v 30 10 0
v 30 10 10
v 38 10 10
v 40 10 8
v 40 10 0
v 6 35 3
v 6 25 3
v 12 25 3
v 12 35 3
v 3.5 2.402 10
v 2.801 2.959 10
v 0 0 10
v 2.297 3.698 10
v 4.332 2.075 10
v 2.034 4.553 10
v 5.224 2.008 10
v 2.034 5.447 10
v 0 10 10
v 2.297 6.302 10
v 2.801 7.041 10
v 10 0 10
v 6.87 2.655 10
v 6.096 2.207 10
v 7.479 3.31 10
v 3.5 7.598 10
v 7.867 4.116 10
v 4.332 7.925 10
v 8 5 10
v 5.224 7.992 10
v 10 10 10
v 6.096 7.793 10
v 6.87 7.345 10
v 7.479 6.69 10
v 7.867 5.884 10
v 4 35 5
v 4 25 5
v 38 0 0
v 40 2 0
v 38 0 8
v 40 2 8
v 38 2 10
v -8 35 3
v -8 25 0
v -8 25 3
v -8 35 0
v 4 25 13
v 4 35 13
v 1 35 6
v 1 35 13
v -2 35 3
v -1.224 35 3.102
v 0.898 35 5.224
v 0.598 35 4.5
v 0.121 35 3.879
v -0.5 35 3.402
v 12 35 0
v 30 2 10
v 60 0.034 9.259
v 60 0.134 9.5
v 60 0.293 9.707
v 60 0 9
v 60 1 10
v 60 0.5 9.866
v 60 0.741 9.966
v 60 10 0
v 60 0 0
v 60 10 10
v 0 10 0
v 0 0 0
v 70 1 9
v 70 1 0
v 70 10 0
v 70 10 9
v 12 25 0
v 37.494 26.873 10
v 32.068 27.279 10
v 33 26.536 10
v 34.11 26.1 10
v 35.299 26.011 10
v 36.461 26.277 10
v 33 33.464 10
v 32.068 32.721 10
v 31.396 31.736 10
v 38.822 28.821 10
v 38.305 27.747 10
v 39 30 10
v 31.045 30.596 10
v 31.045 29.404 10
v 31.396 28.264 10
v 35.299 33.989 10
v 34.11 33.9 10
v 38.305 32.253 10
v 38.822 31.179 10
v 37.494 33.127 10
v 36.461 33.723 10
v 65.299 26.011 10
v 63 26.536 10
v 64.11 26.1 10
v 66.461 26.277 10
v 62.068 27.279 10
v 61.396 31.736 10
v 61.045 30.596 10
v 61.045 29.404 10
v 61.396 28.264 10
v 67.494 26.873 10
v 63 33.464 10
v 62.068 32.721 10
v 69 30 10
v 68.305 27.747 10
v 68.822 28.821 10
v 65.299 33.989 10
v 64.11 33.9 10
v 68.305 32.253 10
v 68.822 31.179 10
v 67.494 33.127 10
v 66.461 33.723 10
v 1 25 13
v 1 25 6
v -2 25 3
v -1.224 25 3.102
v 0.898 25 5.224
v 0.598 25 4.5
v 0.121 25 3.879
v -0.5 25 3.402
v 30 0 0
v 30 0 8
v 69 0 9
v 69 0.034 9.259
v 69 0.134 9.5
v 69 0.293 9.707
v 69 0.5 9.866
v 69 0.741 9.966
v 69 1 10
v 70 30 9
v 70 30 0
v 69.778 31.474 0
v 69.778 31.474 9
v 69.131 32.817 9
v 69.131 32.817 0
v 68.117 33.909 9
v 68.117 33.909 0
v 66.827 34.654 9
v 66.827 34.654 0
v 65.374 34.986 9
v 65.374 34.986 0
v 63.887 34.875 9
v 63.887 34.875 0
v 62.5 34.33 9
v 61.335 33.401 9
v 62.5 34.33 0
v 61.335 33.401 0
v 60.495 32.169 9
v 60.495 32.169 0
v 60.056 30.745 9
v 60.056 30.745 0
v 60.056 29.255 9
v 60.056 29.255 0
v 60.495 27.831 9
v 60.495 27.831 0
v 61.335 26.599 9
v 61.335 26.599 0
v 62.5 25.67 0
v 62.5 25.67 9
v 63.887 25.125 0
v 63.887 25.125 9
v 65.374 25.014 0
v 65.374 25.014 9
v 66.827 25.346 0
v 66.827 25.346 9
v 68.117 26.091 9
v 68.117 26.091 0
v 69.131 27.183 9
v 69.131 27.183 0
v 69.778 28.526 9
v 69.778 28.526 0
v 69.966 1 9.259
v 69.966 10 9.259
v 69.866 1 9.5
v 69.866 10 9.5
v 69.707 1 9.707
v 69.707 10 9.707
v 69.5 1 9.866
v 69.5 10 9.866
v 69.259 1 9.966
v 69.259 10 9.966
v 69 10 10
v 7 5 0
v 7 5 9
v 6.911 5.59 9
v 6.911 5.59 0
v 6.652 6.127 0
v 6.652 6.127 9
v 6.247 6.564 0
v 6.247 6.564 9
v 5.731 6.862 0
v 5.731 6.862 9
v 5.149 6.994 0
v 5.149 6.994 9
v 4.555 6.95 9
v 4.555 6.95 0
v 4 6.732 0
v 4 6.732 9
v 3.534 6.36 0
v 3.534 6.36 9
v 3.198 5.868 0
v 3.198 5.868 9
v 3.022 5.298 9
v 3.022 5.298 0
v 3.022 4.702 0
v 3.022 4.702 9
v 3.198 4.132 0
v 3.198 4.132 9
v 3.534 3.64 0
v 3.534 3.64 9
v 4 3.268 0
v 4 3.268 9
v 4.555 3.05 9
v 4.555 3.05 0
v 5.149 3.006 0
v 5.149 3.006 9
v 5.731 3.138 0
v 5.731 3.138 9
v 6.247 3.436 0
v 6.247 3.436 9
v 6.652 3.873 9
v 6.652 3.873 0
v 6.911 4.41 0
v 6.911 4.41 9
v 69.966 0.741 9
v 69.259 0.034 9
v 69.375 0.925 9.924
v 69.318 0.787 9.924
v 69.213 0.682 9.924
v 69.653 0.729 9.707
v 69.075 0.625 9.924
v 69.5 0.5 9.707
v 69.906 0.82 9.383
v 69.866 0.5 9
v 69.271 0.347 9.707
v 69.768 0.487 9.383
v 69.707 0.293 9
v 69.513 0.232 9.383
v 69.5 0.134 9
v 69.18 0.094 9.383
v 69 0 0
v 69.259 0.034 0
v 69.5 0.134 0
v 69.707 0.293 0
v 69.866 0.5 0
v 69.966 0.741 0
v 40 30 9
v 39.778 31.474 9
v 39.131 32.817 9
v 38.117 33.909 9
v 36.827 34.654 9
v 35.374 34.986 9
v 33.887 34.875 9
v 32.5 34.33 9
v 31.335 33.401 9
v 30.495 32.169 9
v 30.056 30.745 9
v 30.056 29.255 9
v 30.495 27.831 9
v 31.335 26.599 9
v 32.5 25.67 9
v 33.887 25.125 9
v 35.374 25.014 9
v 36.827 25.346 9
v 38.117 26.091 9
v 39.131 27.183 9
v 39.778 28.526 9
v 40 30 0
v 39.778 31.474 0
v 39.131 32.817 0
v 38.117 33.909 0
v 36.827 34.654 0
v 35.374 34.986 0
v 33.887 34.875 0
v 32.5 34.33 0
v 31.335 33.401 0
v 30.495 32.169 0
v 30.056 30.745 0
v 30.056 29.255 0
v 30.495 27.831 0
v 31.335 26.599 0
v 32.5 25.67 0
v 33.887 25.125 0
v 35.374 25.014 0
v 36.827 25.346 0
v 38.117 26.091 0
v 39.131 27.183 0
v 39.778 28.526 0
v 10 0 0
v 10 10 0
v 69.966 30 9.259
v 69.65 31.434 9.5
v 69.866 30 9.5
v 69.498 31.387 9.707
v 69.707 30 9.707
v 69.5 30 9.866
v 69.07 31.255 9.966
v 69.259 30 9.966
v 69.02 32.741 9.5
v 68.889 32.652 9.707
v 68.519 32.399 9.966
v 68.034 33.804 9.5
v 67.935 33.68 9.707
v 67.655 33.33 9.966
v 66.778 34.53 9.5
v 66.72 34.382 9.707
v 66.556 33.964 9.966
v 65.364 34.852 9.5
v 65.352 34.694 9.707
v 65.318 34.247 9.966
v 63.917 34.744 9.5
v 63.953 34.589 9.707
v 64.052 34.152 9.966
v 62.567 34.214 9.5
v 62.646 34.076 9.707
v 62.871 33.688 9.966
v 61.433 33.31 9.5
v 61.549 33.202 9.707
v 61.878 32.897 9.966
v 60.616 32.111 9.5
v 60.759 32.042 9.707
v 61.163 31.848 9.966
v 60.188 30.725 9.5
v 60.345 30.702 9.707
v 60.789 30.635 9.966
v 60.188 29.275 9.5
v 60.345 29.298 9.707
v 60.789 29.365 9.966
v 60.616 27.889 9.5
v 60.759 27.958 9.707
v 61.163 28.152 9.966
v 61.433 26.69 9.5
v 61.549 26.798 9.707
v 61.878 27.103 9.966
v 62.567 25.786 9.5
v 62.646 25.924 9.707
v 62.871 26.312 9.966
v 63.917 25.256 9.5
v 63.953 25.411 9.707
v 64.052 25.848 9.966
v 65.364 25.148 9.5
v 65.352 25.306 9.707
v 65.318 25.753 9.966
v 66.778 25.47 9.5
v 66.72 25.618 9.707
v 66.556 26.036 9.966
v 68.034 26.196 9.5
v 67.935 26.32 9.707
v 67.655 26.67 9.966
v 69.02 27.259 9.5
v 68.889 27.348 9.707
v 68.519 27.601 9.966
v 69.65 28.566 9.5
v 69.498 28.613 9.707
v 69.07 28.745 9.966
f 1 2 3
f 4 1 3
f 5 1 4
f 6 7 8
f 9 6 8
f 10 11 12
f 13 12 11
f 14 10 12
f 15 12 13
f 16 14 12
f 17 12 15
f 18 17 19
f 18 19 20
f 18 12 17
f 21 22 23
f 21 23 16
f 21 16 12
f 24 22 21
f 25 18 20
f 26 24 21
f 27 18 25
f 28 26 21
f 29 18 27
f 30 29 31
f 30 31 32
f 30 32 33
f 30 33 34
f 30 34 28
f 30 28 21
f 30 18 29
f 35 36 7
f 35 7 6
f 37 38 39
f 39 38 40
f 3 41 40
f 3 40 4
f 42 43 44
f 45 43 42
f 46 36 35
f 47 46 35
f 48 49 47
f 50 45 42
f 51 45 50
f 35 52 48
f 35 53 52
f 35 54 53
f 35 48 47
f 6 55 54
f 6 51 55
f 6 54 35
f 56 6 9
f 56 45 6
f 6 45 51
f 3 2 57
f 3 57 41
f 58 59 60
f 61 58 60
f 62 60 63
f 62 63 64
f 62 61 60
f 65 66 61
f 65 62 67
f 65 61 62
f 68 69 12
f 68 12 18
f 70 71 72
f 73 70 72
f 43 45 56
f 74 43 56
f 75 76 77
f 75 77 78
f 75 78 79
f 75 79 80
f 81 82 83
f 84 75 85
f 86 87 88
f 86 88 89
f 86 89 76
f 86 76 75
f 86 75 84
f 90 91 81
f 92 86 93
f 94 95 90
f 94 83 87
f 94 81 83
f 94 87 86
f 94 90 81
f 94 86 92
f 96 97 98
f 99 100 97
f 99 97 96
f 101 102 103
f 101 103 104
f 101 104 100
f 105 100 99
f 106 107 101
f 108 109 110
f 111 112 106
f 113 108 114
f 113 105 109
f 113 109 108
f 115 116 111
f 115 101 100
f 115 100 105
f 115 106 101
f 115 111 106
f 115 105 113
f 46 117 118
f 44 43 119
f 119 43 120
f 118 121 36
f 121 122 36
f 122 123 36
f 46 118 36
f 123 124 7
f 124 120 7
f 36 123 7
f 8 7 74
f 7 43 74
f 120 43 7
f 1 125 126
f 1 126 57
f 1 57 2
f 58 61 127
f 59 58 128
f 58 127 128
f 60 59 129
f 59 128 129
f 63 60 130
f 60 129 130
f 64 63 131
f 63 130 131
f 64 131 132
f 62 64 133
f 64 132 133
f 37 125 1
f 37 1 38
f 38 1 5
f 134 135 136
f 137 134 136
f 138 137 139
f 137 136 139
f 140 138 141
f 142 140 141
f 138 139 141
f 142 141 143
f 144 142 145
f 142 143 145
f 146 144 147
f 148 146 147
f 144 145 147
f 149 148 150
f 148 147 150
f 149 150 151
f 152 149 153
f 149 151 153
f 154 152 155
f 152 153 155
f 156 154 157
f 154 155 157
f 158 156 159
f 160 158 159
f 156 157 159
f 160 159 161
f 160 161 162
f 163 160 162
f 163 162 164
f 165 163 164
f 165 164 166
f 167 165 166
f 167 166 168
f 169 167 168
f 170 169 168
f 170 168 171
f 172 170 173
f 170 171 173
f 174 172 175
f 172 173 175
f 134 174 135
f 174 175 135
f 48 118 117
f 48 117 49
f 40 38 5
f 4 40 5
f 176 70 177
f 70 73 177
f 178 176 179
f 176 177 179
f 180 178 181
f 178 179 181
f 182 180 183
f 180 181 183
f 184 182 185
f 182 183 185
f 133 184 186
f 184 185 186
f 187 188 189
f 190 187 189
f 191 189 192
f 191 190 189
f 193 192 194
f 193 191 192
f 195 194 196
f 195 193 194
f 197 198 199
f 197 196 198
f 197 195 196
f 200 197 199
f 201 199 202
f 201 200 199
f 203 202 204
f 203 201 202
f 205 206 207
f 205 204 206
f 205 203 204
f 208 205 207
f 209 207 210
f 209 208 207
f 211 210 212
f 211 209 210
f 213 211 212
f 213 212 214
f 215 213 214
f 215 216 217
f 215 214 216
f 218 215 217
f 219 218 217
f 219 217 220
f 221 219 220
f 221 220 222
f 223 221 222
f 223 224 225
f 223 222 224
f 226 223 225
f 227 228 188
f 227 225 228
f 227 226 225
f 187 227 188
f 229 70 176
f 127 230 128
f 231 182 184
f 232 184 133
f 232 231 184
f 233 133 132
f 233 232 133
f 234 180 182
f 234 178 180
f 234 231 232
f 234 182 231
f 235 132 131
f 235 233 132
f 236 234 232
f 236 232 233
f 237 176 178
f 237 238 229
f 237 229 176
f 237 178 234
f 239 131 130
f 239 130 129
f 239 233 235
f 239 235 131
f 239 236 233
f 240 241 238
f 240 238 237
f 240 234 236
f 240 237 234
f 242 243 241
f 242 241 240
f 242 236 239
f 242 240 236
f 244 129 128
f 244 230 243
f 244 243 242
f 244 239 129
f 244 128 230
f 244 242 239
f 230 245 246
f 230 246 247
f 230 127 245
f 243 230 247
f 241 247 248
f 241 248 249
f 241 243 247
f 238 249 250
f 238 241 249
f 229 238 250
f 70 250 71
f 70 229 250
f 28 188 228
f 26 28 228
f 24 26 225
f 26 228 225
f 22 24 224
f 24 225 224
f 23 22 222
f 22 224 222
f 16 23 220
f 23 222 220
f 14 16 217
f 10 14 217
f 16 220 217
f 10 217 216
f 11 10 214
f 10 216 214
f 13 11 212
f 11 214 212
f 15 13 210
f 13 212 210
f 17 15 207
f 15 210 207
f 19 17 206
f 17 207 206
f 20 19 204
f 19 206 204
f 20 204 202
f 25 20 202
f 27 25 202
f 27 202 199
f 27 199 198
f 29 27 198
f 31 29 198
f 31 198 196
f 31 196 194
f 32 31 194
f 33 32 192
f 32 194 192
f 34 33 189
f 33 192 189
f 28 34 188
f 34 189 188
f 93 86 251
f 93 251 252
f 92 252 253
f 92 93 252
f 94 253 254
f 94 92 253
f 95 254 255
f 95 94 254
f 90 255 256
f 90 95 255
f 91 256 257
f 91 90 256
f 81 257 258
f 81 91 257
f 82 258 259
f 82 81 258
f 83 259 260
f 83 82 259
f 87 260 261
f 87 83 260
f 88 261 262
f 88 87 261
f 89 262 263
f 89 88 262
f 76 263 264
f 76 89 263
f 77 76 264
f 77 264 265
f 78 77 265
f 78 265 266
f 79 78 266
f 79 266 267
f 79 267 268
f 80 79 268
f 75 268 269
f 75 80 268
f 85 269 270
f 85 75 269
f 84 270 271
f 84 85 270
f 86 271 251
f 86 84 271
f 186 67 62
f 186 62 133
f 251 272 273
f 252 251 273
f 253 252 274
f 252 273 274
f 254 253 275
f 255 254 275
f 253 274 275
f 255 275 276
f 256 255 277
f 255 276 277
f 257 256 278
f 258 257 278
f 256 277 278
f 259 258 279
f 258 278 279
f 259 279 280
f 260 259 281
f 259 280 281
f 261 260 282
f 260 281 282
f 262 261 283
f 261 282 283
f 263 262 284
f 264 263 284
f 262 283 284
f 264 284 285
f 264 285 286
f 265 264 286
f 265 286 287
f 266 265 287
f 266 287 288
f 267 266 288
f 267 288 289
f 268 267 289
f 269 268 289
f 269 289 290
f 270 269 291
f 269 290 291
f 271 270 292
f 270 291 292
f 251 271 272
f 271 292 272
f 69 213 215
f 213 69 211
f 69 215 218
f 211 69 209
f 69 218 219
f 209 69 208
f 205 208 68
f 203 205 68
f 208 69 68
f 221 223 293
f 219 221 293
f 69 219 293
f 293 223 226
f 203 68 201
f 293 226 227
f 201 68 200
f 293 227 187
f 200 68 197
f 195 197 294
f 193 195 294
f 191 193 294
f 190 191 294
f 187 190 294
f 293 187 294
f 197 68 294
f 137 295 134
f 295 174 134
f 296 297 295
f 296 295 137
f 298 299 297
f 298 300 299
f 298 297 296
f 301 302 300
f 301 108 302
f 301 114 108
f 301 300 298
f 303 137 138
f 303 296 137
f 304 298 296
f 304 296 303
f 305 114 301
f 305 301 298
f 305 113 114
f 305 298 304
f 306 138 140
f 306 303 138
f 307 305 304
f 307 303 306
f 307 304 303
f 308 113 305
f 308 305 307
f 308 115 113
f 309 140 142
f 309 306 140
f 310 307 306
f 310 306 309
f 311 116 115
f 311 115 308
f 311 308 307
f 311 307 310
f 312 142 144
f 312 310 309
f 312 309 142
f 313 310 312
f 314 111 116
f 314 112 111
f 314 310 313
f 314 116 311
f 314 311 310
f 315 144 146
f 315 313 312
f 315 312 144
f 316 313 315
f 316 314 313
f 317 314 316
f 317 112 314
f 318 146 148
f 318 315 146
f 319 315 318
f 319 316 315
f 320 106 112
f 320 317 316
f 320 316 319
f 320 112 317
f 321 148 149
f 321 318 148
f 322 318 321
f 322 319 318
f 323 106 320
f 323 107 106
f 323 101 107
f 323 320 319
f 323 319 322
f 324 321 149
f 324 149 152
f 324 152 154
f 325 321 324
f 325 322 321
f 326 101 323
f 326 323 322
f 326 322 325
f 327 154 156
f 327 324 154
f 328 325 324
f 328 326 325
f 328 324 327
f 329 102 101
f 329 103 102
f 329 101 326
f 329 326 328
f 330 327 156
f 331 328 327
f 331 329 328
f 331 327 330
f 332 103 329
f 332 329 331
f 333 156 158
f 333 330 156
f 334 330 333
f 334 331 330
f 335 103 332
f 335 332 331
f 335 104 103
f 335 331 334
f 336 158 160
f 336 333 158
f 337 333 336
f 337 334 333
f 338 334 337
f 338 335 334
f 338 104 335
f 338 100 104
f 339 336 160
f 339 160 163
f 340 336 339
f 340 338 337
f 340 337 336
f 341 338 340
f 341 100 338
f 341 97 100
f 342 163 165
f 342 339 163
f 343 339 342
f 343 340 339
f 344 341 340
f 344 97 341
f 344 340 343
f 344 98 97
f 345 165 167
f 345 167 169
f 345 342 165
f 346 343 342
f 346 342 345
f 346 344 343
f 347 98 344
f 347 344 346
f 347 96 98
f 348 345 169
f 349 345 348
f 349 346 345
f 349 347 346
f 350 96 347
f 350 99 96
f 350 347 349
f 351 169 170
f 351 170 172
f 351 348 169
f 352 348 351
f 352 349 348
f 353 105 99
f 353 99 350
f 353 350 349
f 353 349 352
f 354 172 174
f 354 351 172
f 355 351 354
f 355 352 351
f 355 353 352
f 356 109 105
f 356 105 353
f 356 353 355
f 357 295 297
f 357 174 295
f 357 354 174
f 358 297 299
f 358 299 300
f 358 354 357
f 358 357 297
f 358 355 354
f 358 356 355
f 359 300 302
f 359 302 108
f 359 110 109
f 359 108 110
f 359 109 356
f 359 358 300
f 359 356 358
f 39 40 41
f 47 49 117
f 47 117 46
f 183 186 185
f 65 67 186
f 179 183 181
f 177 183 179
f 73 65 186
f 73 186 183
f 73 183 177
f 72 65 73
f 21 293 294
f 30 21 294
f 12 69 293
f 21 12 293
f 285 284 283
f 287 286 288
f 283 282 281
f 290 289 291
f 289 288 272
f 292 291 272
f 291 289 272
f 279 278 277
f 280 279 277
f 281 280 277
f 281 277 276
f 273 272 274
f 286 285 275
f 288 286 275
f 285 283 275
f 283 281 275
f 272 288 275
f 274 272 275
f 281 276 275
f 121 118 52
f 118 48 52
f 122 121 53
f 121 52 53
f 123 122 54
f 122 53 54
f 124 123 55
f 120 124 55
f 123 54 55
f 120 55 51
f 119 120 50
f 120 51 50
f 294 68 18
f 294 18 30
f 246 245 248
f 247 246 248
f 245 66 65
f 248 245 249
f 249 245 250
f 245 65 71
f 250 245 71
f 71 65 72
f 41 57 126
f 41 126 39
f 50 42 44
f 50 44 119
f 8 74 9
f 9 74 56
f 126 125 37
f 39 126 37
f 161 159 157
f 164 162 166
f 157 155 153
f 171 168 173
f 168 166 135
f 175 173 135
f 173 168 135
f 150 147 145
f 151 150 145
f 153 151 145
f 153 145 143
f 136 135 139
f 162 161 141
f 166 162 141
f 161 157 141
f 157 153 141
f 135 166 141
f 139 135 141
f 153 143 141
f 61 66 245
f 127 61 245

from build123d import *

# Parameters (mm, degrees)
BOX_W             = 10
BOX_H             = 10
BOX_DEPTH         = 10
FILLET_R          = 1
BOX002_W          = 10
BOX002_H          = 10
BOX002_DEPTH      = 10
CHAMFER_SIZE      = 2
CYLINDER_R        = 2
CYLINDER_DEPTH    = 20
BOX001_W          = 10
BOX001_H          = 10
BOX001_DEPTH      = 10
CHAMFER001_SIZE   = 1
CYLINDER001_R     = 5
CYLINDER001_DEPTH = 10
FILLET001_R       = 1
CYLINDER002_R     = 5
CYLINDER002_DEPTH = 10
CHAMFER002_SIZE   = 1
BOX004_W          = 3
BOX004_H          = 10
BOX004_DEPTH      = 10
BOX003_W          = 20
BOX003_H          = 10
BOX003_DEPTH      = 3
CHAMFER003_SIZE   = 2
FILLET002_R       = 3


with BuildPart() as fillet_body:
    # Box → Box (new body)
    with BuildSketch(Plane(origin=(60, 0, 0), x_dir=(1, 0, 0), z_dir=(0, 0, 1))):
        with Locations((5, 5)):
            Rectangle(BOX_W, BOX_H)
    extrude(amount=BOX_DEPTH)

    # Fillet
    fillet_edges = [fillet_body.edges().sort_by_distance(p)[0] for p in [
        (70, 0, 5),
        (70, 5, 10),
        (65, 0, 10),
    ]]
    fillet(fillet_edges, radius=FILLET_R)


with BuildPart() as chamfer_body:
    # Box002 → Box002 (new body)
    with BuildSketch(Plane(origin=(30, 0, 0), x_dir=(1, 0, 0), z_dir=(0, 0, 1))):
        with Locations((5, 5)):
            Rectangle(BOX002_W, BOX002_H)
    extrude(amount=BOX002_DEPTH)

    # Chamfer
    chamfer_edges = [chamfer_body.edges().sort_by_distance(p)[0] for p in [
        (40, 0, 5),
        (40, 5, 10),
        (35, 0, 10),
    ]]
    chamfer(chamfer_edges, length=CHAMFER_SIZE)


with BuildPart() as cylinder:
    # Cylinder → Cylinder (new body)
    with BuildSketch(Plane(origin=(5, 5, -2), x_dir=(1, 0, 0), z_dir=(0, 0, 1))):
        Circle(CYLINDER_R)
    extrude(amount=CYLINDER_DEPTH)


with BuildPart() as chamfer001:
    # Box001 → Box001 (new body)
    with BuildSketch(Plane.XY):
        with Locations((5, 5)):
            Rectangle(BOX001_W, BOX001_H)
    extrude(amount=BOX001_DEPTH)

    # Cut: cut Cylinder
    add(cylinder.part, mode=Mode.SUBTRACT)

    # Chamfer001
    chamfer001_edges = [chamfer001.edges().sort_by_distance(p)[0] for p in [
        (3, 5, 10),
    ]]
    chamfer(chamfer001_edges, length=CHAMFER001_SIZE)


with BuildPart() as fillet001:
    # Cylinder001 → Cylinder001 (new body)
    with BuildSketch(Plane(origin=(65, 30, 0), x_dir=(1, 0, 0), z_dir=(0, 0, 1))):
        Circle(CYLINDER001_R)
    extrude(amount=CYLINDER001_DEPTH)

    # Fillet001
    fillet001_edges = [fillet001.edges().sort_by_distance(p)[0] for p in [
        (60, 30, 10),
    ]]
    fillet(fillet001_edges, radius=FILLET001_R)


with BuildPart() as chamfer002:
    # Cylinder002 → Cylinder002 (new body)
    with BuildSketch(Plane(origin=(35, 30, 0), x_dir=(1, 0, 0), z_dir=(0, 0, 1))):
        Circle(CYLINDER002_R)
    extrude(amount=CYLINDER002_DEPTH)

    # Chamfer002
    chamfer002_edges = [chamfer002.edges().sort_by_distance(p)[0] for p in [
        (30, 30, 10),
    ]]
    chamfer(chamfer002_edges, length=CHAMFER002_SIZE)


with BuildPart() as box004:
    # Box004 → Box004 (new body)
    with BuildSketch(Plane(origin=(1, 25, 3), x_dir=(1, 0, 0), z_dir=(0, 0, 1))):
        with Locations((1.5, 5)):
            Rectangle(BOX004_W, BOX004_H)
    extrude(amount=BOX004_DEPTH)


with BuildPart() as fillet002:
    # Box003 → Box003 (new body)
    with BuildSketch(Plane(origin=(-8, 25, 0), x_dir=(1, 0, 0), z_dir=(0, 0, 1))):
        with Locations((10, 5)):
            Rectangle(BOX003_W, BOX003_H)
    extrude(amount=BOX003_DEPTH)

    # Fusion: union Box004
    add(box004.part)

    # Chamfer003
    chamfer003_edges = [fillet002.edges().sort_by_distance(p)[0] for p in [
        (4, 30, 3),
    ]]
    chamfer(chamfer003_edges, length=CHAMFER003_SIZE)

    # Fillet002
    fillet002_edges = [fillet002.edges().sort_by_distance(p)[0] for p in [
        (1, 30, 3),
    ]]
    fillet(fillet002_edges, radius=FILLET002_R)


solid = Compound([fillet_body.part, chamfer_body.part, chamfer001.part, fillet001.part, chamfer002.part, fillet002.part])
